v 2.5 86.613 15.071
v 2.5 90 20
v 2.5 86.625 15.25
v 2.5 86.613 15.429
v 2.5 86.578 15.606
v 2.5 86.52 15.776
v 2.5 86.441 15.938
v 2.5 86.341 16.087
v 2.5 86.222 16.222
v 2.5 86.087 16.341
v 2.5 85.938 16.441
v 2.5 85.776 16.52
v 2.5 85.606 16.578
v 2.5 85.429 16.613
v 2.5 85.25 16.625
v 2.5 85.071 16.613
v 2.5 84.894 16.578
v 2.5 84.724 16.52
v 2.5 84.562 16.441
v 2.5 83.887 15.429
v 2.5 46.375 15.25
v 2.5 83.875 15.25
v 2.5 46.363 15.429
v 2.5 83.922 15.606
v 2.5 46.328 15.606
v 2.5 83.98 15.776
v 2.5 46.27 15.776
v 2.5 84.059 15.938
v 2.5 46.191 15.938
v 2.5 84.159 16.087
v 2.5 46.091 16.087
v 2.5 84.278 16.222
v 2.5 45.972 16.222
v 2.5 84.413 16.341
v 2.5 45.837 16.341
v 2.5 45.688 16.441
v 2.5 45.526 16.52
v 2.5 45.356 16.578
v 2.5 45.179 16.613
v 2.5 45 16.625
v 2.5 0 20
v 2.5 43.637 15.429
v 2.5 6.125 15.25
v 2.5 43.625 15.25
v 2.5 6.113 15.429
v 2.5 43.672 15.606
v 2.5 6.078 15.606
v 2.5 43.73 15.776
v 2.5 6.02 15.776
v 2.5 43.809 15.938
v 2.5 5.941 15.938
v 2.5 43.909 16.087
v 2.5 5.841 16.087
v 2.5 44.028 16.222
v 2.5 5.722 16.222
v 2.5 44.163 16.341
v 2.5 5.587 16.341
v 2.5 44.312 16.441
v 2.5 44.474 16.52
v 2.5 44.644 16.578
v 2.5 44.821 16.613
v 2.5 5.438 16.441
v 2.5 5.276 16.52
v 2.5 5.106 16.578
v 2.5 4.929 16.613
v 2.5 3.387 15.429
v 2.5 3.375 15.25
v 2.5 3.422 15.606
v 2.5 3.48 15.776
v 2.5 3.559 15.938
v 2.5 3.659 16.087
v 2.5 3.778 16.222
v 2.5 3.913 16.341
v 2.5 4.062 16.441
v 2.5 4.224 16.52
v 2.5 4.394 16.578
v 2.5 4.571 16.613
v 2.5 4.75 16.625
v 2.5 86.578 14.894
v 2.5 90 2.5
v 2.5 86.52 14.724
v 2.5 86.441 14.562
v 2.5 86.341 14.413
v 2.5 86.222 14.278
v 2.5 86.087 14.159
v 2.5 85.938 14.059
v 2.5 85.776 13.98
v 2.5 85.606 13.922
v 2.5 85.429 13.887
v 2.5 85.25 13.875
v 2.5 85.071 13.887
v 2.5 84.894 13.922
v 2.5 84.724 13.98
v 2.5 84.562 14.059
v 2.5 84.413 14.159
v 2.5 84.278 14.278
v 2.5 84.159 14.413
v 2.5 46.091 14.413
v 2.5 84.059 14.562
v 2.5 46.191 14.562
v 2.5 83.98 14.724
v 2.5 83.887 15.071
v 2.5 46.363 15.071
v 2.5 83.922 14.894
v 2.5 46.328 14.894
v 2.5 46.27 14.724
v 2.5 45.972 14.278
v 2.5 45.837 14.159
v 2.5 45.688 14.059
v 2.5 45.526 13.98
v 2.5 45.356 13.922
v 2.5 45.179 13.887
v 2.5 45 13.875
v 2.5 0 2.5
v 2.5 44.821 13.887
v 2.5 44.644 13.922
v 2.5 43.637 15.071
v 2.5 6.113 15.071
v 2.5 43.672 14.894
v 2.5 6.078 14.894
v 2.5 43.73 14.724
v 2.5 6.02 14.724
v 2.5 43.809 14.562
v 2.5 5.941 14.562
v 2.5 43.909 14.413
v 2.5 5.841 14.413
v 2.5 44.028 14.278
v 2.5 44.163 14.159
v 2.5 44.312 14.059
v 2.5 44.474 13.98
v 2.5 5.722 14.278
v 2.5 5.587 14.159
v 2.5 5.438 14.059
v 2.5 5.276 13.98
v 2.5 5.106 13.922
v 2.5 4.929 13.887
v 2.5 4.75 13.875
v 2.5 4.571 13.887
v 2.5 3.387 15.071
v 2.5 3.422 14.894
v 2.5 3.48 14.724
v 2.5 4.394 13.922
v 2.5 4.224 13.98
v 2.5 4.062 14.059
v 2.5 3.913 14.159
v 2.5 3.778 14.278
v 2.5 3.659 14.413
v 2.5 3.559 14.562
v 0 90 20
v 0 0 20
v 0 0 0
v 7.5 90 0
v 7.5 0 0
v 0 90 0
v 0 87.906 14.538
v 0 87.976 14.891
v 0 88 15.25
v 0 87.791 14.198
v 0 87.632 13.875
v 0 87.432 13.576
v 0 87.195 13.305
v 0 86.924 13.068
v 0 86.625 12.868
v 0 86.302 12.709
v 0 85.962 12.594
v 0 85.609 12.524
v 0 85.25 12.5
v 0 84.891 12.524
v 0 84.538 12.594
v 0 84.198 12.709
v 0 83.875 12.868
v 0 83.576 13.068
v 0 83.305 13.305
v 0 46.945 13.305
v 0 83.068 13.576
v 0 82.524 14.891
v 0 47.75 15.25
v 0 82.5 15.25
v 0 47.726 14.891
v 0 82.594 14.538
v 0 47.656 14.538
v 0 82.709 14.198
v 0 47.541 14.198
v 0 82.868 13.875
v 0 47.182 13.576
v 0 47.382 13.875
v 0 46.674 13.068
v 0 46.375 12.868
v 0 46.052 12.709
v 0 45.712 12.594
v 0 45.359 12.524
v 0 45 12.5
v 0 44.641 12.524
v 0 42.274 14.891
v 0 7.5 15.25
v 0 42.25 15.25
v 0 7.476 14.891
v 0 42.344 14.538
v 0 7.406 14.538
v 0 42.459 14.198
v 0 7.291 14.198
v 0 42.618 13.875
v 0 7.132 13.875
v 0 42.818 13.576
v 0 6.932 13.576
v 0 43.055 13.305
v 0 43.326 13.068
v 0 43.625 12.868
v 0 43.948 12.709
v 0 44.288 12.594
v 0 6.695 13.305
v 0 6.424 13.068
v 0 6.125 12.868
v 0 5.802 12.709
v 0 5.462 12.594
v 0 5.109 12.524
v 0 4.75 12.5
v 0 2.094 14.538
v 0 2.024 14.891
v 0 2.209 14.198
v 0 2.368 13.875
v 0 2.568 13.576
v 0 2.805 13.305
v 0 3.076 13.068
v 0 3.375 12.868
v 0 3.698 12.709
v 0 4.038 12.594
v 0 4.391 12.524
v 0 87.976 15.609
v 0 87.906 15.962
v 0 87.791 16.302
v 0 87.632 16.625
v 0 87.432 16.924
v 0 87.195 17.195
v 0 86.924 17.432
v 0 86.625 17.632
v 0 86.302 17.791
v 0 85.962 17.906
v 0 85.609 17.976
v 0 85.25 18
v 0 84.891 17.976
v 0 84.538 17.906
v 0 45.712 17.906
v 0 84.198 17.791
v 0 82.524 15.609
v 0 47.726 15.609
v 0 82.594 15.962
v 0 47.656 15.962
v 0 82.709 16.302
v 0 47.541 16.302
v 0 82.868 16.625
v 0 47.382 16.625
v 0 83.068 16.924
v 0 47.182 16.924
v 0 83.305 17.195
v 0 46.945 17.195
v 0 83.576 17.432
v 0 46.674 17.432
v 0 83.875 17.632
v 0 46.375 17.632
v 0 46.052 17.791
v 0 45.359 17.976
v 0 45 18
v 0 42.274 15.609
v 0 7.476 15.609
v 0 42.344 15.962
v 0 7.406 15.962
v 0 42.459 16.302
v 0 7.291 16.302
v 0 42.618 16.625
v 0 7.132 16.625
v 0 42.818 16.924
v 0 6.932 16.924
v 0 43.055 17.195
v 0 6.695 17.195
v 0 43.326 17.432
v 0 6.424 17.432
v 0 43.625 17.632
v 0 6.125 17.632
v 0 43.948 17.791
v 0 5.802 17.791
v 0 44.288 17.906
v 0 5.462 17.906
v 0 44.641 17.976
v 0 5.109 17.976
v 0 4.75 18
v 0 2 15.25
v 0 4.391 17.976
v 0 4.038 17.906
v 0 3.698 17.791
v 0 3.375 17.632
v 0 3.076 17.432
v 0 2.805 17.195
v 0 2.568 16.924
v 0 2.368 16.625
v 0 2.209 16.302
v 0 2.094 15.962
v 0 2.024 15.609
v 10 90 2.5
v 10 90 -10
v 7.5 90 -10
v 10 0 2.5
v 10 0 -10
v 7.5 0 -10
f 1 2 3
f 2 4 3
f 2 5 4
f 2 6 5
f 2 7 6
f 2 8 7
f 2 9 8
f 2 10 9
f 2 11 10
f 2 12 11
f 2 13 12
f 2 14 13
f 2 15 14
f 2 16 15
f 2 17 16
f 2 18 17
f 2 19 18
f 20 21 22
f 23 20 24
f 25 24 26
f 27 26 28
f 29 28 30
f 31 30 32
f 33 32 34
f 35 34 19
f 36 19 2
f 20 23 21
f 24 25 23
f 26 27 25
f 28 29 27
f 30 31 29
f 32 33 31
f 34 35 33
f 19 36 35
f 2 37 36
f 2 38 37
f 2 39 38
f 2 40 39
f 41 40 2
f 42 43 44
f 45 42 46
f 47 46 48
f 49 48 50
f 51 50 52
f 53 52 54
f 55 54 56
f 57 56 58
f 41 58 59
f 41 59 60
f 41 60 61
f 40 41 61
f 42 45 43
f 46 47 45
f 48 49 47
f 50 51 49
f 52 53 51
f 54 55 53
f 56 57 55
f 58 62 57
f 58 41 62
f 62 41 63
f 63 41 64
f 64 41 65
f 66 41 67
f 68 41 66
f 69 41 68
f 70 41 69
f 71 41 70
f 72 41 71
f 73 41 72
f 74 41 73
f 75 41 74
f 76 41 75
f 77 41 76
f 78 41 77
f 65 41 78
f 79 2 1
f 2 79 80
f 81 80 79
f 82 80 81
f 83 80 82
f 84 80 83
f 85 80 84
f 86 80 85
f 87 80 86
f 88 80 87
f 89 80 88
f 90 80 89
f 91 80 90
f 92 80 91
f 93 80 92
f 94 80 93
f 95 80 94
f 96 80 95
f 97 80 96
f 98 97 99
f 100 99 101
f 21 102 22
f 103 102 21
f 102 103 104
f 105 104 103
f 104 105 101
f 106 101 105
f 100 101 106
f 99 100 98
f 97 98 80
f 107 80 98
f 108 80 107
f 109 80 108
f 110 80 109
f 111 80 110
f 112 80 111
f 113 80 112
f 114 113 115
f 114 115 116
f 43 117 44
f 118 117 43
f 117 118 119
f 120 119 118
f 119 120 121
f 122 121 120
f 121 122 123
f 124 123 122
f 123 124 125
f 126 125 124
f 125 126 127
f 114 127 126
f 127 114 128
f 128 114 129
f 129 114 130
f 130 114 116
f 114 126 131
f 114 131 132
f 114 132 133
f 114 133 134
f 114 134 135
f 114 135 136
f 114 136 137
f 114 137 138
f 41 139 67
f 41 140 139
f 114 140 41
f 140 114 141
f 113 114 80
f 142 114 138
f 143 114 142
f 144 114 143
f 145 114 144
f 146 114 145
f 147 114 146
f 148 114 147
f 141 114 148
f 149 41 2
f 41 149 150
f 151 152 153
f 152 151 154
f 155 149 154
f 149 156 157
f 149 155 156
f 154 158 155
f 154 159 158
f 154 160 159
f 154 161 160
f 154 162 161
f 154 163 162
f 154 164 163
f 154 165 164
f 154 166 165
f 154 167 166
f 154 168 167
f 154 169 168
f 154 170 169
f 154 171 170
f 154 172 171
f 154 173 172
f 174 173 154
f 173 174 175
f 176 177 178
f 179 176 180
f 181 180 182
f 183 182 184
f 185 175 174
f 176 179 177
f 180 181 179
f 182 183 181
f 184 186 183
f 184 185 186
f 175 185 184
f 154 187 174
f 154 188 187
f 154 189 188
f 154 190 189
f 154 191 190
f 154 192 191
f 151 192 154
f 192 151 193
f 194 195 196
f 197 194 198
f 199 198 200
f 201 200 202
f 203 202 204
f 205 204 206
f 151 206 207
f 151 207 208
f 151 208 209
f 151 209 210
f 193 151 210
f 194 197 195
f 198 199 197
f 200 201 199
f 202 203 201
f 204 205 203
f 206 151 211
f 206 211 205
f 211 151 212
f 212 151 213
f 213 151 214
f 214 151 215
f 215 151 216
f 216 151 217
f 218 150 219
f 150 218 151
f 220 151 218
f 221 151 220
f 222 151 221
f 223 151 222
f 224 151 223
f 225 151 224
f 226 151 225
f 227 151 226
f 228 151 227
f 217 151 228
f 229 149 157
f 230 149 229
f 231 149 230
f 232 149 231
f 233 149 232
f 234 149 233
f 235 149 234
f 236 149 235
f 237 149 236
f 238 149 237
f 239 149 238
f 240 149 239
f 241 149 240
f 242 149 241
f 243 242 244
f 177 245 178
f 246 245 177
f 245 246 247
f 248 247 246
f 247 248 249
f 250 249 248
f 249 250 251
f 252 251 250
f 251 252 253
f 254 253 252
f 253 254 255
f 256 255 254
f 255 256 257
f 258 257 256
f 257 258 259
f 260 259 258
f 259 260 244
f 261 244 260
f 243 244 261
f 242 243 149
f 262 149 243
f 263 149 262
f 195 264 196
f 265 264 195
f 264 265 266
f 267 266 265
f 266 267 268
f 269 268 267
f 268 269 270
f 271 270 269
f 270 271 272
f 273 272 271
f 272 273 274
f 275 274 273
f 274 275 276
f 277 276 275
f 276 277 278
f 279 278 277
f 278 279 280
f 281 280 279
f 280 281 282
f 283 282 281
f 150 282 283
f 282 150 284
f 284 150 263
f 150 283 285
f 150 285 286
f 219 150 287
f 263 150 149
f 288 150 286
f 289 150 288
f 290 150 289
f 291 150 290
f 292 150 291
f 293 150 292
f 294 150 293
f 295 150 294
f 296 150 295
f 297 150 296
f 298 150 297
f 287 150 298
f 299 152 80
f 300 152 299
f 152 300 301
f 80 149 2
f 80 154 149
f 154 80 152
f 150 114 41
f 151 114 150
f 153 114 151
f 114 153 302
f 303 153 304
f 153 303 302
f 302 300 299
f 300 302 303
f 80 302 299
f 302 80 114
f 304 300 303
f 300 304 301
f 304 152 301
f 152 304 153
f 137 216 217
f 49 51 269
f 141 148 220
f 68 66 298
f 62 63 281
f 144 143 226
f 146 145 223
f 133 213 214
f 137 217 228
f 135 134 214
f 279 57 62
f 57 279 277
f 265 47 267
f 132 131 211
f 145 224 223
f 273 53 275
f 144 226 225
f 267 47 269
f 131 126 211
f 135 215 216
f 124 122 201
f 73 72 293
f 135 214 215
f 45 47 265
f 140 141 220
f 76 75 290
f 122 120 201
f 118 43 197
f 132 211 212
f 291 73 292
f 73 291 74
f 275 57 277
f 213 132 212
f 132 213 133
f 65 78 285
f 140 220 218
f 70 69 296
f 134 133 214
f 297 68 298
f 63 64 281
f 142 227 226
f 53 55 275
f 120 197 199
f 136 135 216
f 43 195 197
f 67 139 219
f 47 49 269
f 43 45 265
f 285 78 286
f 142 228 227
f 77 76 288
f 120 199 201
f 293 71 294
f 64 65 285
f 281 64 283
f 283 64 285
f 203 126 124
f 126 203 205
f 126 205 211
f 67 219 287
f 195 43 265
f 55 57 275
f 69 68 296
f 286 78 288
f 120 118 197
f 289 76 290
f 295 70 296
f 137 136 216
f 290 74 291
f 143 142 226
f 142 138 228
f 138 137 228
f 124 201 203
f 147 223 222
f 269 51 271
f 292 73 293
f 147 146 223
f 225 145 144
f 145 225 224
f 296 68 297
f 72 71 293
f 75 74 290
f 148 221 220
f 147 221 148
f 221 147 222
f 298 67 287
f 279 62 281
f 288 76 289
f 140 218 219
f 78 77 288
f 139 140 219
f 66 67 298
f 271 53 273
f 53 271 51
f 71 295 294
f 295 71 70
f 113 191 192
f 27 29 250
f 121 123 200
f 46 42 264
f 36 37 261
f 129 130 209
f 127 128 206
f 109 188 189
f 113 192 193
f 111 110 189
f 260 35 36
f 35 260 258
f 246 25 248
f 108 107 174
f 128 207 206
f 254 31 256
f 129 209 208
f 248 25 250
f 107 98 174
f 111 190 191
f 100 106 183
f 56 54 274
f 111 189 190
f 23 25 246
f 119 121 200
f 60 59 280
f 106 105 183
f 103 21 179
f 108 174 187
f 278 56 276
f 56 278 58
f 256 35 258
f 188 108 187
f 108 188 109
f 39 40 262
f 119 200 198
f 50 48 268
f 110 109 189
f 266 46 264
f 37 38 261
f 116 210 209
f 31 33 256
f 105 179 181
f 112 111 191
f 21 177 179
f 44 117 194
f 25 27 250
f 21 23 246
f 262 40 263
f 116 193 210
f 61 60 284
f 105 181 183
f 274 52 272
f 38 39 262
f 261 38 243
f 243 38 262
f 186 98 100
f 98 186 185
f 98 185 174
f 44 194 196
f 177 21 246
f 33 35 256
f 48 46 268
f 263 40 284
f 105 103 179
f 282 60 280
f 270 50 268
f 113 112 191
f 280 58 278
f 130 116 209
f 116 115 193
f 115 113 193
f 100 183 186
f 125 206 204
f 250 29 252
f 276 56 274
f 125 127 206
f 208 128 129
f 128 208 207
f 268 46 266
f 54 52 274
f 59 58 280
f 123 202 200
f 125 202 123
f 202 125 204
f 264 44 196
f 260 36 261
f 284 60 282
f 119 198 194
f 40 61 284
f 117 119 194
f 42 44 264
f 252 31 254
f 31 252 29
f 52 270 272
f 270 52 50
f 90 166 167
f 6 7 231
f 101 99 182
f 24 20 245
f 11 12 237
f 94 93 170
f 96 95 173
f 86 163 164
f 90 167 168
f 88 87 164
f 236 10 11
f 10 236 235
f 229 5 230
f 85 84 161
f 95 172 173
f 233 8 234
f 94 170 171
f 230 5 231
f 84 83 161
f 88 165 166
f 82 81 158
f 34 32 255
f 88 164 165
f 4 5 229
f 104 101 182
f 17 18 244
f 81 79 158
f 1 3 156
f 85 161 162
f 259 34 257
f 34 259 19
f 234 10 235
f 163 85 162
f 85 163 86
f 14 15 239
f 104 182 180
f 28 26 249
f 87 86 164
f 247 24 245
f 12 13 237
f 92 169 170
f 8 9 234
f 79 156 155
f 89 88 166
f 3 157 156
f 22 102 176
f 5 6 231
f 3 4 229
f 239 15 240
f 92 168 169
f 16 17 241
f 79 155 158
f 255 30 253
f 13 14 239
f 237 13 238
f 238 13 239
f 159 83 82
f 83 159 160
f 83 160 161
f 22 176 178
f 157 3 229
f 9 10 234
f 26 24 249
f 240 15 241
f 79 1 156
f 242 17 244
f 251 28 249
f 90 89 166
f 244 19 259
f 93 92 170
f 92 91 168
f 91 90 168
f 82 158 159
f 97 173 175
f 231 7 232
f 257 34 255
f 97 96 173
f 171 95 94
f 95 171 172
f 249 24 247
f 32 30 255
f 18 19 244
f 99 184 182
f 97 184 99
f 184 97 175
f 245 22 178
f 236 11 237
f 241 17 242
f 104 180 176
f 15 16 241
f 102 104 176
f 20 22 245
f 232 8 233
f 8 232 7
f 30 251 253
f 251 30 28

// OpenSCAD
// Drawer foot-pull hook
// Units: mm
//
// Purpose:
// Mount this on the underside/front edge of a drawer so you can catch it
// with your foot and pull the drawer open hands-free.

$fn = 48;

back_thickness = 2.5;
std_thickness = 2.5;

width = 90;
back_size = 20;
under_size = 10;
drop_size = 10;

support_width = 5;

// screw size
screw_diameter = 2.75;
screw_head = 5.5;
screw_head_depth = 2.5;

module screw_hole() {
    rotate(a=[0, 90, 0])
    union() {
        cylinder(h=back_thickness, d=screw_diameter);
        cylinder(h=screw_head_depth, d2=screw_diameter, d1=screw_head);
    }  
}

module body() {
    union() {
        cube([back_thickness, width, back_size]);
        cube([under_size, width, std_thickness]);
        translate(v=[under_size - std_thickness, 0, -drop_size])
        cube([std_thickness, width, drop_size]);
        translate(v=[under_size - std_thickness - support_width, 0, 0])
        polyhedron(
            [
                [0, 0, 0],
                [support_width, 0, 0],
                [support_width, 0, -support_width],
                [0, width, 0],
                [support_width, width, 0],
                [support_width, width, -support_width],
            ],
            [
                [0, 1, 2],
                [0, 1, 4, 3],
                [1, 2, 5, 4],
                [0, 2, 5, 3],
                [3, 4, 5],
            ]
        );
    }
}

difference() {
    body();
    translate(v=[0, 0, back_size - (screw_head/2) - 2]) {
        translate(v=[0, (screw_head/2) + 2, 0])
        screw_hole();
        translate(v=[0, (width/2), 0])
        screw_hole();
        translate(v=[0, width - (screw_head/2) - 2, 0])
        screw_hole();
    }
}
